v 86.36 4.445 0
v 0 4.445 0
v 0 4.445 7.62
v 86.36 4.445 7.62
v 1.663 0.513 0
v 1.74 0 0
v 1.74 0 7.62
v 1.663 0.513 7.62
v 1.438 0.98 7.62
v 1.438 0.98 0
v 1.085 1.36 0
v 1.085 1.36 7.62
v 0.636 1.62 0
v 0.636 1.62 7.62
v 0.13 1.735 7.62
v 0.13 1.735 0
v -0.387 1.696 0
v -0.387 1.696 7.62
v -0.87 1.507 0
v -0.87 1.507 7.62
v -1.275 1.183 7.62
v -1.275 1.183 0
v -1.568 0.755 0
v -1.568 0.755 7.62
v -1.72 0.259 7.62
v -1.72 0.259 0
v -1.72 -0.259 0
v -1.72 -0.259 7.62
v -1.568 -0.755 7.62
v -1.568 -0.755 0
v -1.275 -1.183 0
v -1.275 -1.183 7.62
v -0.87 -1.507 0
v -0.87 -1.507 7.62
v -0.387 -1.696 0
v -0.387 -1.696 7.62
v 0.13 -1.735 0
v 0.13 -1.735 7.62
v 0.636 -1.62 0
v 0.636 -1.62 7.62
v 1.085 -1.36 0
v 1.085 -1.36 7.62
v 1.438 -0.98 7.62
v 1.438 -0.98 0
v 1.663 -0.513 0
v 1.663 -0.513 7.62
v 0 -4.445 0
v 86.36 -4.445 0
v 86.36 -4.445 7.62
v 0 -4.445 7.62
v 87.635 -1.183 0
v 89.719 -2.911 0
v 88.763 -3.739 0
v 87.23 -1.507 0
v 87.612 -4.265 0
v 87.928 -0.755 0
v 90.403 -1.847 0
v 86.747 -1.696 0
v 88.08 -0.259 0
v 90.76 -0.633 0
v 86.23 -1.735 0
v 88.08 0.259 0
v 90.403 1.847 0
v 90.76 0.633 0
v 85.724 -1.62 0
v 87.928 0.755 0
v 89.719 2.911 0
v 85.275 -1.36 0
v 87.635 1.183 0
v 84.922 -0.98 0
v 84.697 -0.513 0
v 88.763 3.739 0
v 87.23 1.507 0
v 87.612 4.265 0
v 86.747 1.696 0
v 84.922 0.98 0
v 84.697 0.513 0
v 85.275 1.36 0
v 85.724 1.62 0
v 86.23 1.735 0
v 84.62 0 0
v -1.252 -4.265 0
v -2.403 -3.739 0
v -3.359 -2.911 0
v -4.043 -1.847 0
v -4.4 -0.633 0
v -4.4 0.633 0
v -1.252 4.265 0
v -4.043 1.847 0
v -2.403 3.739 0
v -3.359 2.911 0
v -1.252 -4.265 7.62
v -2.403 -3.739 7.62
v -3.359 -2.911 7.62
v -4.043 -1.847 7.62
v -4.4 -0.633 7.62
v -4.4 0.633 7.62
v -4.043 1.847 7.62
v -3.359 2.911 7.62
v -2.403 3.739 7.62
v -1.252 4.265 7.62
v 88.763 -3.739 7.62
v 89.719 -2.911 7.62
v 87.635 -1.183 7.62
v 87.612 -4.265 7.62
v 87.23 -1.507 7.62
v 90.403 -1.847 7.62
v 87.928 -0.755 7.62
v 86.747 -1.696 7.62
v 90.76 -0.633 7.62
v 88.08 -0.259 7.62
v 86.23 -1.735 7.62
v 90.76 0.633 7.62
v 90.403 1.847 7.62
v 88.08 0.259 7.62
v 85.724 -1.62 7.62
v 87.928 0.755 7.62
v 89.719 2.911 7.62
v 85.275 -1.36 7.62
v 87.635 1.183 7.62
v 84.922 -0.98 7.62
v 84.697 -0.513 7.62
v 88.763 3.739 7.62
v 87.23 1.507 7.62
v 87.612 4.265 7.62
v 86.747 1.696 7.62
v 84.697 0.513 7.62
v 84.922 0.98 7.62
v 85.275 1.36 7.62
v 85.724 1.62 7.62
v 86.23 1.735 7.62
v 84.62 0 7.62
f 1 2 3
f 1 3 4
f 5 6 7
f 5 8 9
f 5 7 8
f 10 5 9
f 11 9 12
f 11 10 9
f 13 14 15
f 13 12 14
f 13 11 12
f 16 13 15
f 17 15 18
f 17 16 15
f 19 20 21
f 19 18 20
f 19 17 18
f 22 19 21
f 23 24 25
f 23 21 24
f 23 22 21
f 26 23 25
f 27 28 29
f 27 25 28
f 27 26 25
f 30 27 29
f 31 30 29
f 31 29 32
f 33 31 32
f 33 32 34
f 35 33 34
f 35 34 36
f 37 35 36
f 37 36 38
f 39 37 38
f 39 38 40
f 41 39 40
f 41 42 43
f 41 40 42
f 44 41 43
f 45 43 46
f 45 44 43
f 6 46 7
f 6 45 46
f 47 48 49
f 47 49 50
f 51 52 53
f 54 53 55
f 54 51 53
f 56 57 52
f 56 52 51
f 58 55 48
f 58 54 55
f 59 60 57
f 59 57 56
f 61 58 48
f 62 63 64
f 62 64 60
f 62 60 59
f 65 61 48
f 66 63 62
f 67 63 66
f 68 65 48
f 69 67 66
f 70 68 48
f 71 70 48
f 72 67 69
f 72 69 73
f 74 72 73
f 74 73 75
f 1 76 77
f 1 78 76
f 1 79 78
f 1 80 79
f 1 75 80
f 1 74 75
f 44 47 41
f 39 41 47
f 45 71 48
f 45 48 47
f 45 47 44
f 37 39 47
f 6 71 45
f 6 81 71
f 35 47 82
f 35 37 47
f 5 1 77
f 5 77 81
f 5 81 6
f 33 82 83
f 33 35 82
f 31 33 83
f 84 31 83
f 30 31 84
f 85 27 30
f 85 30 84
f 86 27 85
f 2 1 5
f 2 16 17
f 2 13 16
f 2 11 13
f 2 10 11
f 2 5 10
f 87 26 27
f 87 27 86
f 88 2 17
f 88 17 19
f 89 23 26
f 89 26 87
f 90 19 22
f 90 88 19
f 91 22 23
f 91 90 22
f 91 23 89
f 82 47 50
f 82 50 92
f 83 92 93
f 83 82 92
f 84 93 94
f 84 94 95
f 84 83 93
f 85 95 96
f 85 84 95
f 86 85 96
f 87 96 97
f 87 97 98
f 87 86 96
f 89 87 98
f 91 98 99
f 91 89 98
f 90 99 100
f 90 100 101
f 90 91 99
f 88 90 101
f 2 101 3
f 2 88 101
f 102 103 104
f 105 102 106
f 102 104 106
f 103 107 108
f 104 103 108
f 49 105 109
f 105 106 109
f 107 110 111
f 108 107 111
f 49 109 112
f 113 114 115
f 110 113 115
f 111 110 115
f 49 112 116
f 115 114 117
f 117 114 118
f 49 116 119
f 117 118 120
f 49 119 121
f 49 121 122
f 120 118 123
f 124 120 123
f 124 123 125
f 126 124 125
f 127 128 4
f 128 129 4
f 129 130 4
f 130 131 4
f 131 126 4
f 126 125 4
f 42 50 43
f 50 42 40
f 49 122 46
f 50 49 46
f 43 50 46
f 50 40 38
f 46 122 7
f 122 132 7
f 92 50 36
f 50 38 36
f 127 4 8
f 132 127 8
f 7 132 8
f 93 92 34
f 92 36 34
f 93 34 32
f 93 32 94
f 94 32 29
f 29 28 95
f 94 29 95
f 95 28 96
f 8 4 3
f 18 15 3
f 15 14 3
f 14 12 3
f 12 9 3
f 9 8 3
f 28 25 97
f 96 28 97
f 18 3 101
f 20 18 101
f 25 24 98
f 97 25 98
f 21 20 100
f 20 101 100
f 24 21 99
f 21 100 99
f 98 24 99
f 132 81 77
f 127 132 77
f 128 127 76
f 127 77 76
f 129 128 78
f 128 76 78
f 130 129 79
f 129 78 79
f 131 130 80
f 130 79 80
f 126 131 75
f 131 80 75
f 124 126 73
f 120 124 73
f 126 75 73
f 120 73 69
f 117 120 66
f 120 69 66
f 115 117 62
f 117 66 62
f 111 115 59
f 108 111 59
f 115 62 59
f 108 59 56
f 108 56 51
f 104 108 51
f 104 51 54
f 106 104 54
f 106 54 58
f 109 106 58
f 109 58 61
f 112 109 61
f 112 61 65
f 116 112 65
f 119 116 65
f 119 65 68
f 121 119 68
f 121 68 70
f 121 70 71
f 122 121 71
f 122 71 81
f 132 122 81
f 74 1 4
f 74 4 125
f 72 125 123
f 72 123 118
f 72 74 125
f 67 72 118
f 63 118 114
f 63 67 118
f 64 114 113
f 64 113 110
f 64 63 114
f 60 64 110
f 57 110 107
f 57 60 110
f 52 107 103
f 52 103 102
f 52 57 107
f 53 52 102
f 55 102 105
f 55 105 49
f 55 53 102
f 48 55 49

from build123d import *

# Parameters (mm, degrees)
BOSS_EXTRUDE1_DEPTH = 7.62
CUT_EXTRUDE1_START  = -8.62
SKETCH2_R           = 1.7399
CUT_EXTRUDE1_DEPTH  = 9.62


with BuildPart() as part:
    # Sketch1 → Boss-Extrude1 (new body)
    with BuildSketch(Plane.XY):
        with BuildLine():
            Line((0, 4.445), (86.36, 4.445))
            ThreePointArc((86.36, 4.445), (90.805, 0), (86.36, -4.445))
            Line((86.36, -4.445), (0, -4.445))
            ThreePointArc((0, -4.445), (-4.445, 0), (0, 4.445))
        make_face()
    extrude(amount=BOSS_EXTRUDE1_DEPTH)

    # Sketch2 → Cut-Extrude1 (cut)
    with BuildSketch(Plane.XY.offset(7.62).offset(CUT_EXTRUDE1_START)):
        Circle(SKETCH2_R)
    cut_extrude1 = extrude(amount=CUT_EXTRUDE1_DEPTH, mode=Mode.SUBTRACT)

    # Mirror1: Cut-Extrude1 across plane
    add(cut_extrude1.mirror(Plane(origin=(43.18, 0, 0), x_dir=(0, 0, 1), z_dir=(1, 0, 0))), mode=Mode.SUBTRACT)


solid = part.part
